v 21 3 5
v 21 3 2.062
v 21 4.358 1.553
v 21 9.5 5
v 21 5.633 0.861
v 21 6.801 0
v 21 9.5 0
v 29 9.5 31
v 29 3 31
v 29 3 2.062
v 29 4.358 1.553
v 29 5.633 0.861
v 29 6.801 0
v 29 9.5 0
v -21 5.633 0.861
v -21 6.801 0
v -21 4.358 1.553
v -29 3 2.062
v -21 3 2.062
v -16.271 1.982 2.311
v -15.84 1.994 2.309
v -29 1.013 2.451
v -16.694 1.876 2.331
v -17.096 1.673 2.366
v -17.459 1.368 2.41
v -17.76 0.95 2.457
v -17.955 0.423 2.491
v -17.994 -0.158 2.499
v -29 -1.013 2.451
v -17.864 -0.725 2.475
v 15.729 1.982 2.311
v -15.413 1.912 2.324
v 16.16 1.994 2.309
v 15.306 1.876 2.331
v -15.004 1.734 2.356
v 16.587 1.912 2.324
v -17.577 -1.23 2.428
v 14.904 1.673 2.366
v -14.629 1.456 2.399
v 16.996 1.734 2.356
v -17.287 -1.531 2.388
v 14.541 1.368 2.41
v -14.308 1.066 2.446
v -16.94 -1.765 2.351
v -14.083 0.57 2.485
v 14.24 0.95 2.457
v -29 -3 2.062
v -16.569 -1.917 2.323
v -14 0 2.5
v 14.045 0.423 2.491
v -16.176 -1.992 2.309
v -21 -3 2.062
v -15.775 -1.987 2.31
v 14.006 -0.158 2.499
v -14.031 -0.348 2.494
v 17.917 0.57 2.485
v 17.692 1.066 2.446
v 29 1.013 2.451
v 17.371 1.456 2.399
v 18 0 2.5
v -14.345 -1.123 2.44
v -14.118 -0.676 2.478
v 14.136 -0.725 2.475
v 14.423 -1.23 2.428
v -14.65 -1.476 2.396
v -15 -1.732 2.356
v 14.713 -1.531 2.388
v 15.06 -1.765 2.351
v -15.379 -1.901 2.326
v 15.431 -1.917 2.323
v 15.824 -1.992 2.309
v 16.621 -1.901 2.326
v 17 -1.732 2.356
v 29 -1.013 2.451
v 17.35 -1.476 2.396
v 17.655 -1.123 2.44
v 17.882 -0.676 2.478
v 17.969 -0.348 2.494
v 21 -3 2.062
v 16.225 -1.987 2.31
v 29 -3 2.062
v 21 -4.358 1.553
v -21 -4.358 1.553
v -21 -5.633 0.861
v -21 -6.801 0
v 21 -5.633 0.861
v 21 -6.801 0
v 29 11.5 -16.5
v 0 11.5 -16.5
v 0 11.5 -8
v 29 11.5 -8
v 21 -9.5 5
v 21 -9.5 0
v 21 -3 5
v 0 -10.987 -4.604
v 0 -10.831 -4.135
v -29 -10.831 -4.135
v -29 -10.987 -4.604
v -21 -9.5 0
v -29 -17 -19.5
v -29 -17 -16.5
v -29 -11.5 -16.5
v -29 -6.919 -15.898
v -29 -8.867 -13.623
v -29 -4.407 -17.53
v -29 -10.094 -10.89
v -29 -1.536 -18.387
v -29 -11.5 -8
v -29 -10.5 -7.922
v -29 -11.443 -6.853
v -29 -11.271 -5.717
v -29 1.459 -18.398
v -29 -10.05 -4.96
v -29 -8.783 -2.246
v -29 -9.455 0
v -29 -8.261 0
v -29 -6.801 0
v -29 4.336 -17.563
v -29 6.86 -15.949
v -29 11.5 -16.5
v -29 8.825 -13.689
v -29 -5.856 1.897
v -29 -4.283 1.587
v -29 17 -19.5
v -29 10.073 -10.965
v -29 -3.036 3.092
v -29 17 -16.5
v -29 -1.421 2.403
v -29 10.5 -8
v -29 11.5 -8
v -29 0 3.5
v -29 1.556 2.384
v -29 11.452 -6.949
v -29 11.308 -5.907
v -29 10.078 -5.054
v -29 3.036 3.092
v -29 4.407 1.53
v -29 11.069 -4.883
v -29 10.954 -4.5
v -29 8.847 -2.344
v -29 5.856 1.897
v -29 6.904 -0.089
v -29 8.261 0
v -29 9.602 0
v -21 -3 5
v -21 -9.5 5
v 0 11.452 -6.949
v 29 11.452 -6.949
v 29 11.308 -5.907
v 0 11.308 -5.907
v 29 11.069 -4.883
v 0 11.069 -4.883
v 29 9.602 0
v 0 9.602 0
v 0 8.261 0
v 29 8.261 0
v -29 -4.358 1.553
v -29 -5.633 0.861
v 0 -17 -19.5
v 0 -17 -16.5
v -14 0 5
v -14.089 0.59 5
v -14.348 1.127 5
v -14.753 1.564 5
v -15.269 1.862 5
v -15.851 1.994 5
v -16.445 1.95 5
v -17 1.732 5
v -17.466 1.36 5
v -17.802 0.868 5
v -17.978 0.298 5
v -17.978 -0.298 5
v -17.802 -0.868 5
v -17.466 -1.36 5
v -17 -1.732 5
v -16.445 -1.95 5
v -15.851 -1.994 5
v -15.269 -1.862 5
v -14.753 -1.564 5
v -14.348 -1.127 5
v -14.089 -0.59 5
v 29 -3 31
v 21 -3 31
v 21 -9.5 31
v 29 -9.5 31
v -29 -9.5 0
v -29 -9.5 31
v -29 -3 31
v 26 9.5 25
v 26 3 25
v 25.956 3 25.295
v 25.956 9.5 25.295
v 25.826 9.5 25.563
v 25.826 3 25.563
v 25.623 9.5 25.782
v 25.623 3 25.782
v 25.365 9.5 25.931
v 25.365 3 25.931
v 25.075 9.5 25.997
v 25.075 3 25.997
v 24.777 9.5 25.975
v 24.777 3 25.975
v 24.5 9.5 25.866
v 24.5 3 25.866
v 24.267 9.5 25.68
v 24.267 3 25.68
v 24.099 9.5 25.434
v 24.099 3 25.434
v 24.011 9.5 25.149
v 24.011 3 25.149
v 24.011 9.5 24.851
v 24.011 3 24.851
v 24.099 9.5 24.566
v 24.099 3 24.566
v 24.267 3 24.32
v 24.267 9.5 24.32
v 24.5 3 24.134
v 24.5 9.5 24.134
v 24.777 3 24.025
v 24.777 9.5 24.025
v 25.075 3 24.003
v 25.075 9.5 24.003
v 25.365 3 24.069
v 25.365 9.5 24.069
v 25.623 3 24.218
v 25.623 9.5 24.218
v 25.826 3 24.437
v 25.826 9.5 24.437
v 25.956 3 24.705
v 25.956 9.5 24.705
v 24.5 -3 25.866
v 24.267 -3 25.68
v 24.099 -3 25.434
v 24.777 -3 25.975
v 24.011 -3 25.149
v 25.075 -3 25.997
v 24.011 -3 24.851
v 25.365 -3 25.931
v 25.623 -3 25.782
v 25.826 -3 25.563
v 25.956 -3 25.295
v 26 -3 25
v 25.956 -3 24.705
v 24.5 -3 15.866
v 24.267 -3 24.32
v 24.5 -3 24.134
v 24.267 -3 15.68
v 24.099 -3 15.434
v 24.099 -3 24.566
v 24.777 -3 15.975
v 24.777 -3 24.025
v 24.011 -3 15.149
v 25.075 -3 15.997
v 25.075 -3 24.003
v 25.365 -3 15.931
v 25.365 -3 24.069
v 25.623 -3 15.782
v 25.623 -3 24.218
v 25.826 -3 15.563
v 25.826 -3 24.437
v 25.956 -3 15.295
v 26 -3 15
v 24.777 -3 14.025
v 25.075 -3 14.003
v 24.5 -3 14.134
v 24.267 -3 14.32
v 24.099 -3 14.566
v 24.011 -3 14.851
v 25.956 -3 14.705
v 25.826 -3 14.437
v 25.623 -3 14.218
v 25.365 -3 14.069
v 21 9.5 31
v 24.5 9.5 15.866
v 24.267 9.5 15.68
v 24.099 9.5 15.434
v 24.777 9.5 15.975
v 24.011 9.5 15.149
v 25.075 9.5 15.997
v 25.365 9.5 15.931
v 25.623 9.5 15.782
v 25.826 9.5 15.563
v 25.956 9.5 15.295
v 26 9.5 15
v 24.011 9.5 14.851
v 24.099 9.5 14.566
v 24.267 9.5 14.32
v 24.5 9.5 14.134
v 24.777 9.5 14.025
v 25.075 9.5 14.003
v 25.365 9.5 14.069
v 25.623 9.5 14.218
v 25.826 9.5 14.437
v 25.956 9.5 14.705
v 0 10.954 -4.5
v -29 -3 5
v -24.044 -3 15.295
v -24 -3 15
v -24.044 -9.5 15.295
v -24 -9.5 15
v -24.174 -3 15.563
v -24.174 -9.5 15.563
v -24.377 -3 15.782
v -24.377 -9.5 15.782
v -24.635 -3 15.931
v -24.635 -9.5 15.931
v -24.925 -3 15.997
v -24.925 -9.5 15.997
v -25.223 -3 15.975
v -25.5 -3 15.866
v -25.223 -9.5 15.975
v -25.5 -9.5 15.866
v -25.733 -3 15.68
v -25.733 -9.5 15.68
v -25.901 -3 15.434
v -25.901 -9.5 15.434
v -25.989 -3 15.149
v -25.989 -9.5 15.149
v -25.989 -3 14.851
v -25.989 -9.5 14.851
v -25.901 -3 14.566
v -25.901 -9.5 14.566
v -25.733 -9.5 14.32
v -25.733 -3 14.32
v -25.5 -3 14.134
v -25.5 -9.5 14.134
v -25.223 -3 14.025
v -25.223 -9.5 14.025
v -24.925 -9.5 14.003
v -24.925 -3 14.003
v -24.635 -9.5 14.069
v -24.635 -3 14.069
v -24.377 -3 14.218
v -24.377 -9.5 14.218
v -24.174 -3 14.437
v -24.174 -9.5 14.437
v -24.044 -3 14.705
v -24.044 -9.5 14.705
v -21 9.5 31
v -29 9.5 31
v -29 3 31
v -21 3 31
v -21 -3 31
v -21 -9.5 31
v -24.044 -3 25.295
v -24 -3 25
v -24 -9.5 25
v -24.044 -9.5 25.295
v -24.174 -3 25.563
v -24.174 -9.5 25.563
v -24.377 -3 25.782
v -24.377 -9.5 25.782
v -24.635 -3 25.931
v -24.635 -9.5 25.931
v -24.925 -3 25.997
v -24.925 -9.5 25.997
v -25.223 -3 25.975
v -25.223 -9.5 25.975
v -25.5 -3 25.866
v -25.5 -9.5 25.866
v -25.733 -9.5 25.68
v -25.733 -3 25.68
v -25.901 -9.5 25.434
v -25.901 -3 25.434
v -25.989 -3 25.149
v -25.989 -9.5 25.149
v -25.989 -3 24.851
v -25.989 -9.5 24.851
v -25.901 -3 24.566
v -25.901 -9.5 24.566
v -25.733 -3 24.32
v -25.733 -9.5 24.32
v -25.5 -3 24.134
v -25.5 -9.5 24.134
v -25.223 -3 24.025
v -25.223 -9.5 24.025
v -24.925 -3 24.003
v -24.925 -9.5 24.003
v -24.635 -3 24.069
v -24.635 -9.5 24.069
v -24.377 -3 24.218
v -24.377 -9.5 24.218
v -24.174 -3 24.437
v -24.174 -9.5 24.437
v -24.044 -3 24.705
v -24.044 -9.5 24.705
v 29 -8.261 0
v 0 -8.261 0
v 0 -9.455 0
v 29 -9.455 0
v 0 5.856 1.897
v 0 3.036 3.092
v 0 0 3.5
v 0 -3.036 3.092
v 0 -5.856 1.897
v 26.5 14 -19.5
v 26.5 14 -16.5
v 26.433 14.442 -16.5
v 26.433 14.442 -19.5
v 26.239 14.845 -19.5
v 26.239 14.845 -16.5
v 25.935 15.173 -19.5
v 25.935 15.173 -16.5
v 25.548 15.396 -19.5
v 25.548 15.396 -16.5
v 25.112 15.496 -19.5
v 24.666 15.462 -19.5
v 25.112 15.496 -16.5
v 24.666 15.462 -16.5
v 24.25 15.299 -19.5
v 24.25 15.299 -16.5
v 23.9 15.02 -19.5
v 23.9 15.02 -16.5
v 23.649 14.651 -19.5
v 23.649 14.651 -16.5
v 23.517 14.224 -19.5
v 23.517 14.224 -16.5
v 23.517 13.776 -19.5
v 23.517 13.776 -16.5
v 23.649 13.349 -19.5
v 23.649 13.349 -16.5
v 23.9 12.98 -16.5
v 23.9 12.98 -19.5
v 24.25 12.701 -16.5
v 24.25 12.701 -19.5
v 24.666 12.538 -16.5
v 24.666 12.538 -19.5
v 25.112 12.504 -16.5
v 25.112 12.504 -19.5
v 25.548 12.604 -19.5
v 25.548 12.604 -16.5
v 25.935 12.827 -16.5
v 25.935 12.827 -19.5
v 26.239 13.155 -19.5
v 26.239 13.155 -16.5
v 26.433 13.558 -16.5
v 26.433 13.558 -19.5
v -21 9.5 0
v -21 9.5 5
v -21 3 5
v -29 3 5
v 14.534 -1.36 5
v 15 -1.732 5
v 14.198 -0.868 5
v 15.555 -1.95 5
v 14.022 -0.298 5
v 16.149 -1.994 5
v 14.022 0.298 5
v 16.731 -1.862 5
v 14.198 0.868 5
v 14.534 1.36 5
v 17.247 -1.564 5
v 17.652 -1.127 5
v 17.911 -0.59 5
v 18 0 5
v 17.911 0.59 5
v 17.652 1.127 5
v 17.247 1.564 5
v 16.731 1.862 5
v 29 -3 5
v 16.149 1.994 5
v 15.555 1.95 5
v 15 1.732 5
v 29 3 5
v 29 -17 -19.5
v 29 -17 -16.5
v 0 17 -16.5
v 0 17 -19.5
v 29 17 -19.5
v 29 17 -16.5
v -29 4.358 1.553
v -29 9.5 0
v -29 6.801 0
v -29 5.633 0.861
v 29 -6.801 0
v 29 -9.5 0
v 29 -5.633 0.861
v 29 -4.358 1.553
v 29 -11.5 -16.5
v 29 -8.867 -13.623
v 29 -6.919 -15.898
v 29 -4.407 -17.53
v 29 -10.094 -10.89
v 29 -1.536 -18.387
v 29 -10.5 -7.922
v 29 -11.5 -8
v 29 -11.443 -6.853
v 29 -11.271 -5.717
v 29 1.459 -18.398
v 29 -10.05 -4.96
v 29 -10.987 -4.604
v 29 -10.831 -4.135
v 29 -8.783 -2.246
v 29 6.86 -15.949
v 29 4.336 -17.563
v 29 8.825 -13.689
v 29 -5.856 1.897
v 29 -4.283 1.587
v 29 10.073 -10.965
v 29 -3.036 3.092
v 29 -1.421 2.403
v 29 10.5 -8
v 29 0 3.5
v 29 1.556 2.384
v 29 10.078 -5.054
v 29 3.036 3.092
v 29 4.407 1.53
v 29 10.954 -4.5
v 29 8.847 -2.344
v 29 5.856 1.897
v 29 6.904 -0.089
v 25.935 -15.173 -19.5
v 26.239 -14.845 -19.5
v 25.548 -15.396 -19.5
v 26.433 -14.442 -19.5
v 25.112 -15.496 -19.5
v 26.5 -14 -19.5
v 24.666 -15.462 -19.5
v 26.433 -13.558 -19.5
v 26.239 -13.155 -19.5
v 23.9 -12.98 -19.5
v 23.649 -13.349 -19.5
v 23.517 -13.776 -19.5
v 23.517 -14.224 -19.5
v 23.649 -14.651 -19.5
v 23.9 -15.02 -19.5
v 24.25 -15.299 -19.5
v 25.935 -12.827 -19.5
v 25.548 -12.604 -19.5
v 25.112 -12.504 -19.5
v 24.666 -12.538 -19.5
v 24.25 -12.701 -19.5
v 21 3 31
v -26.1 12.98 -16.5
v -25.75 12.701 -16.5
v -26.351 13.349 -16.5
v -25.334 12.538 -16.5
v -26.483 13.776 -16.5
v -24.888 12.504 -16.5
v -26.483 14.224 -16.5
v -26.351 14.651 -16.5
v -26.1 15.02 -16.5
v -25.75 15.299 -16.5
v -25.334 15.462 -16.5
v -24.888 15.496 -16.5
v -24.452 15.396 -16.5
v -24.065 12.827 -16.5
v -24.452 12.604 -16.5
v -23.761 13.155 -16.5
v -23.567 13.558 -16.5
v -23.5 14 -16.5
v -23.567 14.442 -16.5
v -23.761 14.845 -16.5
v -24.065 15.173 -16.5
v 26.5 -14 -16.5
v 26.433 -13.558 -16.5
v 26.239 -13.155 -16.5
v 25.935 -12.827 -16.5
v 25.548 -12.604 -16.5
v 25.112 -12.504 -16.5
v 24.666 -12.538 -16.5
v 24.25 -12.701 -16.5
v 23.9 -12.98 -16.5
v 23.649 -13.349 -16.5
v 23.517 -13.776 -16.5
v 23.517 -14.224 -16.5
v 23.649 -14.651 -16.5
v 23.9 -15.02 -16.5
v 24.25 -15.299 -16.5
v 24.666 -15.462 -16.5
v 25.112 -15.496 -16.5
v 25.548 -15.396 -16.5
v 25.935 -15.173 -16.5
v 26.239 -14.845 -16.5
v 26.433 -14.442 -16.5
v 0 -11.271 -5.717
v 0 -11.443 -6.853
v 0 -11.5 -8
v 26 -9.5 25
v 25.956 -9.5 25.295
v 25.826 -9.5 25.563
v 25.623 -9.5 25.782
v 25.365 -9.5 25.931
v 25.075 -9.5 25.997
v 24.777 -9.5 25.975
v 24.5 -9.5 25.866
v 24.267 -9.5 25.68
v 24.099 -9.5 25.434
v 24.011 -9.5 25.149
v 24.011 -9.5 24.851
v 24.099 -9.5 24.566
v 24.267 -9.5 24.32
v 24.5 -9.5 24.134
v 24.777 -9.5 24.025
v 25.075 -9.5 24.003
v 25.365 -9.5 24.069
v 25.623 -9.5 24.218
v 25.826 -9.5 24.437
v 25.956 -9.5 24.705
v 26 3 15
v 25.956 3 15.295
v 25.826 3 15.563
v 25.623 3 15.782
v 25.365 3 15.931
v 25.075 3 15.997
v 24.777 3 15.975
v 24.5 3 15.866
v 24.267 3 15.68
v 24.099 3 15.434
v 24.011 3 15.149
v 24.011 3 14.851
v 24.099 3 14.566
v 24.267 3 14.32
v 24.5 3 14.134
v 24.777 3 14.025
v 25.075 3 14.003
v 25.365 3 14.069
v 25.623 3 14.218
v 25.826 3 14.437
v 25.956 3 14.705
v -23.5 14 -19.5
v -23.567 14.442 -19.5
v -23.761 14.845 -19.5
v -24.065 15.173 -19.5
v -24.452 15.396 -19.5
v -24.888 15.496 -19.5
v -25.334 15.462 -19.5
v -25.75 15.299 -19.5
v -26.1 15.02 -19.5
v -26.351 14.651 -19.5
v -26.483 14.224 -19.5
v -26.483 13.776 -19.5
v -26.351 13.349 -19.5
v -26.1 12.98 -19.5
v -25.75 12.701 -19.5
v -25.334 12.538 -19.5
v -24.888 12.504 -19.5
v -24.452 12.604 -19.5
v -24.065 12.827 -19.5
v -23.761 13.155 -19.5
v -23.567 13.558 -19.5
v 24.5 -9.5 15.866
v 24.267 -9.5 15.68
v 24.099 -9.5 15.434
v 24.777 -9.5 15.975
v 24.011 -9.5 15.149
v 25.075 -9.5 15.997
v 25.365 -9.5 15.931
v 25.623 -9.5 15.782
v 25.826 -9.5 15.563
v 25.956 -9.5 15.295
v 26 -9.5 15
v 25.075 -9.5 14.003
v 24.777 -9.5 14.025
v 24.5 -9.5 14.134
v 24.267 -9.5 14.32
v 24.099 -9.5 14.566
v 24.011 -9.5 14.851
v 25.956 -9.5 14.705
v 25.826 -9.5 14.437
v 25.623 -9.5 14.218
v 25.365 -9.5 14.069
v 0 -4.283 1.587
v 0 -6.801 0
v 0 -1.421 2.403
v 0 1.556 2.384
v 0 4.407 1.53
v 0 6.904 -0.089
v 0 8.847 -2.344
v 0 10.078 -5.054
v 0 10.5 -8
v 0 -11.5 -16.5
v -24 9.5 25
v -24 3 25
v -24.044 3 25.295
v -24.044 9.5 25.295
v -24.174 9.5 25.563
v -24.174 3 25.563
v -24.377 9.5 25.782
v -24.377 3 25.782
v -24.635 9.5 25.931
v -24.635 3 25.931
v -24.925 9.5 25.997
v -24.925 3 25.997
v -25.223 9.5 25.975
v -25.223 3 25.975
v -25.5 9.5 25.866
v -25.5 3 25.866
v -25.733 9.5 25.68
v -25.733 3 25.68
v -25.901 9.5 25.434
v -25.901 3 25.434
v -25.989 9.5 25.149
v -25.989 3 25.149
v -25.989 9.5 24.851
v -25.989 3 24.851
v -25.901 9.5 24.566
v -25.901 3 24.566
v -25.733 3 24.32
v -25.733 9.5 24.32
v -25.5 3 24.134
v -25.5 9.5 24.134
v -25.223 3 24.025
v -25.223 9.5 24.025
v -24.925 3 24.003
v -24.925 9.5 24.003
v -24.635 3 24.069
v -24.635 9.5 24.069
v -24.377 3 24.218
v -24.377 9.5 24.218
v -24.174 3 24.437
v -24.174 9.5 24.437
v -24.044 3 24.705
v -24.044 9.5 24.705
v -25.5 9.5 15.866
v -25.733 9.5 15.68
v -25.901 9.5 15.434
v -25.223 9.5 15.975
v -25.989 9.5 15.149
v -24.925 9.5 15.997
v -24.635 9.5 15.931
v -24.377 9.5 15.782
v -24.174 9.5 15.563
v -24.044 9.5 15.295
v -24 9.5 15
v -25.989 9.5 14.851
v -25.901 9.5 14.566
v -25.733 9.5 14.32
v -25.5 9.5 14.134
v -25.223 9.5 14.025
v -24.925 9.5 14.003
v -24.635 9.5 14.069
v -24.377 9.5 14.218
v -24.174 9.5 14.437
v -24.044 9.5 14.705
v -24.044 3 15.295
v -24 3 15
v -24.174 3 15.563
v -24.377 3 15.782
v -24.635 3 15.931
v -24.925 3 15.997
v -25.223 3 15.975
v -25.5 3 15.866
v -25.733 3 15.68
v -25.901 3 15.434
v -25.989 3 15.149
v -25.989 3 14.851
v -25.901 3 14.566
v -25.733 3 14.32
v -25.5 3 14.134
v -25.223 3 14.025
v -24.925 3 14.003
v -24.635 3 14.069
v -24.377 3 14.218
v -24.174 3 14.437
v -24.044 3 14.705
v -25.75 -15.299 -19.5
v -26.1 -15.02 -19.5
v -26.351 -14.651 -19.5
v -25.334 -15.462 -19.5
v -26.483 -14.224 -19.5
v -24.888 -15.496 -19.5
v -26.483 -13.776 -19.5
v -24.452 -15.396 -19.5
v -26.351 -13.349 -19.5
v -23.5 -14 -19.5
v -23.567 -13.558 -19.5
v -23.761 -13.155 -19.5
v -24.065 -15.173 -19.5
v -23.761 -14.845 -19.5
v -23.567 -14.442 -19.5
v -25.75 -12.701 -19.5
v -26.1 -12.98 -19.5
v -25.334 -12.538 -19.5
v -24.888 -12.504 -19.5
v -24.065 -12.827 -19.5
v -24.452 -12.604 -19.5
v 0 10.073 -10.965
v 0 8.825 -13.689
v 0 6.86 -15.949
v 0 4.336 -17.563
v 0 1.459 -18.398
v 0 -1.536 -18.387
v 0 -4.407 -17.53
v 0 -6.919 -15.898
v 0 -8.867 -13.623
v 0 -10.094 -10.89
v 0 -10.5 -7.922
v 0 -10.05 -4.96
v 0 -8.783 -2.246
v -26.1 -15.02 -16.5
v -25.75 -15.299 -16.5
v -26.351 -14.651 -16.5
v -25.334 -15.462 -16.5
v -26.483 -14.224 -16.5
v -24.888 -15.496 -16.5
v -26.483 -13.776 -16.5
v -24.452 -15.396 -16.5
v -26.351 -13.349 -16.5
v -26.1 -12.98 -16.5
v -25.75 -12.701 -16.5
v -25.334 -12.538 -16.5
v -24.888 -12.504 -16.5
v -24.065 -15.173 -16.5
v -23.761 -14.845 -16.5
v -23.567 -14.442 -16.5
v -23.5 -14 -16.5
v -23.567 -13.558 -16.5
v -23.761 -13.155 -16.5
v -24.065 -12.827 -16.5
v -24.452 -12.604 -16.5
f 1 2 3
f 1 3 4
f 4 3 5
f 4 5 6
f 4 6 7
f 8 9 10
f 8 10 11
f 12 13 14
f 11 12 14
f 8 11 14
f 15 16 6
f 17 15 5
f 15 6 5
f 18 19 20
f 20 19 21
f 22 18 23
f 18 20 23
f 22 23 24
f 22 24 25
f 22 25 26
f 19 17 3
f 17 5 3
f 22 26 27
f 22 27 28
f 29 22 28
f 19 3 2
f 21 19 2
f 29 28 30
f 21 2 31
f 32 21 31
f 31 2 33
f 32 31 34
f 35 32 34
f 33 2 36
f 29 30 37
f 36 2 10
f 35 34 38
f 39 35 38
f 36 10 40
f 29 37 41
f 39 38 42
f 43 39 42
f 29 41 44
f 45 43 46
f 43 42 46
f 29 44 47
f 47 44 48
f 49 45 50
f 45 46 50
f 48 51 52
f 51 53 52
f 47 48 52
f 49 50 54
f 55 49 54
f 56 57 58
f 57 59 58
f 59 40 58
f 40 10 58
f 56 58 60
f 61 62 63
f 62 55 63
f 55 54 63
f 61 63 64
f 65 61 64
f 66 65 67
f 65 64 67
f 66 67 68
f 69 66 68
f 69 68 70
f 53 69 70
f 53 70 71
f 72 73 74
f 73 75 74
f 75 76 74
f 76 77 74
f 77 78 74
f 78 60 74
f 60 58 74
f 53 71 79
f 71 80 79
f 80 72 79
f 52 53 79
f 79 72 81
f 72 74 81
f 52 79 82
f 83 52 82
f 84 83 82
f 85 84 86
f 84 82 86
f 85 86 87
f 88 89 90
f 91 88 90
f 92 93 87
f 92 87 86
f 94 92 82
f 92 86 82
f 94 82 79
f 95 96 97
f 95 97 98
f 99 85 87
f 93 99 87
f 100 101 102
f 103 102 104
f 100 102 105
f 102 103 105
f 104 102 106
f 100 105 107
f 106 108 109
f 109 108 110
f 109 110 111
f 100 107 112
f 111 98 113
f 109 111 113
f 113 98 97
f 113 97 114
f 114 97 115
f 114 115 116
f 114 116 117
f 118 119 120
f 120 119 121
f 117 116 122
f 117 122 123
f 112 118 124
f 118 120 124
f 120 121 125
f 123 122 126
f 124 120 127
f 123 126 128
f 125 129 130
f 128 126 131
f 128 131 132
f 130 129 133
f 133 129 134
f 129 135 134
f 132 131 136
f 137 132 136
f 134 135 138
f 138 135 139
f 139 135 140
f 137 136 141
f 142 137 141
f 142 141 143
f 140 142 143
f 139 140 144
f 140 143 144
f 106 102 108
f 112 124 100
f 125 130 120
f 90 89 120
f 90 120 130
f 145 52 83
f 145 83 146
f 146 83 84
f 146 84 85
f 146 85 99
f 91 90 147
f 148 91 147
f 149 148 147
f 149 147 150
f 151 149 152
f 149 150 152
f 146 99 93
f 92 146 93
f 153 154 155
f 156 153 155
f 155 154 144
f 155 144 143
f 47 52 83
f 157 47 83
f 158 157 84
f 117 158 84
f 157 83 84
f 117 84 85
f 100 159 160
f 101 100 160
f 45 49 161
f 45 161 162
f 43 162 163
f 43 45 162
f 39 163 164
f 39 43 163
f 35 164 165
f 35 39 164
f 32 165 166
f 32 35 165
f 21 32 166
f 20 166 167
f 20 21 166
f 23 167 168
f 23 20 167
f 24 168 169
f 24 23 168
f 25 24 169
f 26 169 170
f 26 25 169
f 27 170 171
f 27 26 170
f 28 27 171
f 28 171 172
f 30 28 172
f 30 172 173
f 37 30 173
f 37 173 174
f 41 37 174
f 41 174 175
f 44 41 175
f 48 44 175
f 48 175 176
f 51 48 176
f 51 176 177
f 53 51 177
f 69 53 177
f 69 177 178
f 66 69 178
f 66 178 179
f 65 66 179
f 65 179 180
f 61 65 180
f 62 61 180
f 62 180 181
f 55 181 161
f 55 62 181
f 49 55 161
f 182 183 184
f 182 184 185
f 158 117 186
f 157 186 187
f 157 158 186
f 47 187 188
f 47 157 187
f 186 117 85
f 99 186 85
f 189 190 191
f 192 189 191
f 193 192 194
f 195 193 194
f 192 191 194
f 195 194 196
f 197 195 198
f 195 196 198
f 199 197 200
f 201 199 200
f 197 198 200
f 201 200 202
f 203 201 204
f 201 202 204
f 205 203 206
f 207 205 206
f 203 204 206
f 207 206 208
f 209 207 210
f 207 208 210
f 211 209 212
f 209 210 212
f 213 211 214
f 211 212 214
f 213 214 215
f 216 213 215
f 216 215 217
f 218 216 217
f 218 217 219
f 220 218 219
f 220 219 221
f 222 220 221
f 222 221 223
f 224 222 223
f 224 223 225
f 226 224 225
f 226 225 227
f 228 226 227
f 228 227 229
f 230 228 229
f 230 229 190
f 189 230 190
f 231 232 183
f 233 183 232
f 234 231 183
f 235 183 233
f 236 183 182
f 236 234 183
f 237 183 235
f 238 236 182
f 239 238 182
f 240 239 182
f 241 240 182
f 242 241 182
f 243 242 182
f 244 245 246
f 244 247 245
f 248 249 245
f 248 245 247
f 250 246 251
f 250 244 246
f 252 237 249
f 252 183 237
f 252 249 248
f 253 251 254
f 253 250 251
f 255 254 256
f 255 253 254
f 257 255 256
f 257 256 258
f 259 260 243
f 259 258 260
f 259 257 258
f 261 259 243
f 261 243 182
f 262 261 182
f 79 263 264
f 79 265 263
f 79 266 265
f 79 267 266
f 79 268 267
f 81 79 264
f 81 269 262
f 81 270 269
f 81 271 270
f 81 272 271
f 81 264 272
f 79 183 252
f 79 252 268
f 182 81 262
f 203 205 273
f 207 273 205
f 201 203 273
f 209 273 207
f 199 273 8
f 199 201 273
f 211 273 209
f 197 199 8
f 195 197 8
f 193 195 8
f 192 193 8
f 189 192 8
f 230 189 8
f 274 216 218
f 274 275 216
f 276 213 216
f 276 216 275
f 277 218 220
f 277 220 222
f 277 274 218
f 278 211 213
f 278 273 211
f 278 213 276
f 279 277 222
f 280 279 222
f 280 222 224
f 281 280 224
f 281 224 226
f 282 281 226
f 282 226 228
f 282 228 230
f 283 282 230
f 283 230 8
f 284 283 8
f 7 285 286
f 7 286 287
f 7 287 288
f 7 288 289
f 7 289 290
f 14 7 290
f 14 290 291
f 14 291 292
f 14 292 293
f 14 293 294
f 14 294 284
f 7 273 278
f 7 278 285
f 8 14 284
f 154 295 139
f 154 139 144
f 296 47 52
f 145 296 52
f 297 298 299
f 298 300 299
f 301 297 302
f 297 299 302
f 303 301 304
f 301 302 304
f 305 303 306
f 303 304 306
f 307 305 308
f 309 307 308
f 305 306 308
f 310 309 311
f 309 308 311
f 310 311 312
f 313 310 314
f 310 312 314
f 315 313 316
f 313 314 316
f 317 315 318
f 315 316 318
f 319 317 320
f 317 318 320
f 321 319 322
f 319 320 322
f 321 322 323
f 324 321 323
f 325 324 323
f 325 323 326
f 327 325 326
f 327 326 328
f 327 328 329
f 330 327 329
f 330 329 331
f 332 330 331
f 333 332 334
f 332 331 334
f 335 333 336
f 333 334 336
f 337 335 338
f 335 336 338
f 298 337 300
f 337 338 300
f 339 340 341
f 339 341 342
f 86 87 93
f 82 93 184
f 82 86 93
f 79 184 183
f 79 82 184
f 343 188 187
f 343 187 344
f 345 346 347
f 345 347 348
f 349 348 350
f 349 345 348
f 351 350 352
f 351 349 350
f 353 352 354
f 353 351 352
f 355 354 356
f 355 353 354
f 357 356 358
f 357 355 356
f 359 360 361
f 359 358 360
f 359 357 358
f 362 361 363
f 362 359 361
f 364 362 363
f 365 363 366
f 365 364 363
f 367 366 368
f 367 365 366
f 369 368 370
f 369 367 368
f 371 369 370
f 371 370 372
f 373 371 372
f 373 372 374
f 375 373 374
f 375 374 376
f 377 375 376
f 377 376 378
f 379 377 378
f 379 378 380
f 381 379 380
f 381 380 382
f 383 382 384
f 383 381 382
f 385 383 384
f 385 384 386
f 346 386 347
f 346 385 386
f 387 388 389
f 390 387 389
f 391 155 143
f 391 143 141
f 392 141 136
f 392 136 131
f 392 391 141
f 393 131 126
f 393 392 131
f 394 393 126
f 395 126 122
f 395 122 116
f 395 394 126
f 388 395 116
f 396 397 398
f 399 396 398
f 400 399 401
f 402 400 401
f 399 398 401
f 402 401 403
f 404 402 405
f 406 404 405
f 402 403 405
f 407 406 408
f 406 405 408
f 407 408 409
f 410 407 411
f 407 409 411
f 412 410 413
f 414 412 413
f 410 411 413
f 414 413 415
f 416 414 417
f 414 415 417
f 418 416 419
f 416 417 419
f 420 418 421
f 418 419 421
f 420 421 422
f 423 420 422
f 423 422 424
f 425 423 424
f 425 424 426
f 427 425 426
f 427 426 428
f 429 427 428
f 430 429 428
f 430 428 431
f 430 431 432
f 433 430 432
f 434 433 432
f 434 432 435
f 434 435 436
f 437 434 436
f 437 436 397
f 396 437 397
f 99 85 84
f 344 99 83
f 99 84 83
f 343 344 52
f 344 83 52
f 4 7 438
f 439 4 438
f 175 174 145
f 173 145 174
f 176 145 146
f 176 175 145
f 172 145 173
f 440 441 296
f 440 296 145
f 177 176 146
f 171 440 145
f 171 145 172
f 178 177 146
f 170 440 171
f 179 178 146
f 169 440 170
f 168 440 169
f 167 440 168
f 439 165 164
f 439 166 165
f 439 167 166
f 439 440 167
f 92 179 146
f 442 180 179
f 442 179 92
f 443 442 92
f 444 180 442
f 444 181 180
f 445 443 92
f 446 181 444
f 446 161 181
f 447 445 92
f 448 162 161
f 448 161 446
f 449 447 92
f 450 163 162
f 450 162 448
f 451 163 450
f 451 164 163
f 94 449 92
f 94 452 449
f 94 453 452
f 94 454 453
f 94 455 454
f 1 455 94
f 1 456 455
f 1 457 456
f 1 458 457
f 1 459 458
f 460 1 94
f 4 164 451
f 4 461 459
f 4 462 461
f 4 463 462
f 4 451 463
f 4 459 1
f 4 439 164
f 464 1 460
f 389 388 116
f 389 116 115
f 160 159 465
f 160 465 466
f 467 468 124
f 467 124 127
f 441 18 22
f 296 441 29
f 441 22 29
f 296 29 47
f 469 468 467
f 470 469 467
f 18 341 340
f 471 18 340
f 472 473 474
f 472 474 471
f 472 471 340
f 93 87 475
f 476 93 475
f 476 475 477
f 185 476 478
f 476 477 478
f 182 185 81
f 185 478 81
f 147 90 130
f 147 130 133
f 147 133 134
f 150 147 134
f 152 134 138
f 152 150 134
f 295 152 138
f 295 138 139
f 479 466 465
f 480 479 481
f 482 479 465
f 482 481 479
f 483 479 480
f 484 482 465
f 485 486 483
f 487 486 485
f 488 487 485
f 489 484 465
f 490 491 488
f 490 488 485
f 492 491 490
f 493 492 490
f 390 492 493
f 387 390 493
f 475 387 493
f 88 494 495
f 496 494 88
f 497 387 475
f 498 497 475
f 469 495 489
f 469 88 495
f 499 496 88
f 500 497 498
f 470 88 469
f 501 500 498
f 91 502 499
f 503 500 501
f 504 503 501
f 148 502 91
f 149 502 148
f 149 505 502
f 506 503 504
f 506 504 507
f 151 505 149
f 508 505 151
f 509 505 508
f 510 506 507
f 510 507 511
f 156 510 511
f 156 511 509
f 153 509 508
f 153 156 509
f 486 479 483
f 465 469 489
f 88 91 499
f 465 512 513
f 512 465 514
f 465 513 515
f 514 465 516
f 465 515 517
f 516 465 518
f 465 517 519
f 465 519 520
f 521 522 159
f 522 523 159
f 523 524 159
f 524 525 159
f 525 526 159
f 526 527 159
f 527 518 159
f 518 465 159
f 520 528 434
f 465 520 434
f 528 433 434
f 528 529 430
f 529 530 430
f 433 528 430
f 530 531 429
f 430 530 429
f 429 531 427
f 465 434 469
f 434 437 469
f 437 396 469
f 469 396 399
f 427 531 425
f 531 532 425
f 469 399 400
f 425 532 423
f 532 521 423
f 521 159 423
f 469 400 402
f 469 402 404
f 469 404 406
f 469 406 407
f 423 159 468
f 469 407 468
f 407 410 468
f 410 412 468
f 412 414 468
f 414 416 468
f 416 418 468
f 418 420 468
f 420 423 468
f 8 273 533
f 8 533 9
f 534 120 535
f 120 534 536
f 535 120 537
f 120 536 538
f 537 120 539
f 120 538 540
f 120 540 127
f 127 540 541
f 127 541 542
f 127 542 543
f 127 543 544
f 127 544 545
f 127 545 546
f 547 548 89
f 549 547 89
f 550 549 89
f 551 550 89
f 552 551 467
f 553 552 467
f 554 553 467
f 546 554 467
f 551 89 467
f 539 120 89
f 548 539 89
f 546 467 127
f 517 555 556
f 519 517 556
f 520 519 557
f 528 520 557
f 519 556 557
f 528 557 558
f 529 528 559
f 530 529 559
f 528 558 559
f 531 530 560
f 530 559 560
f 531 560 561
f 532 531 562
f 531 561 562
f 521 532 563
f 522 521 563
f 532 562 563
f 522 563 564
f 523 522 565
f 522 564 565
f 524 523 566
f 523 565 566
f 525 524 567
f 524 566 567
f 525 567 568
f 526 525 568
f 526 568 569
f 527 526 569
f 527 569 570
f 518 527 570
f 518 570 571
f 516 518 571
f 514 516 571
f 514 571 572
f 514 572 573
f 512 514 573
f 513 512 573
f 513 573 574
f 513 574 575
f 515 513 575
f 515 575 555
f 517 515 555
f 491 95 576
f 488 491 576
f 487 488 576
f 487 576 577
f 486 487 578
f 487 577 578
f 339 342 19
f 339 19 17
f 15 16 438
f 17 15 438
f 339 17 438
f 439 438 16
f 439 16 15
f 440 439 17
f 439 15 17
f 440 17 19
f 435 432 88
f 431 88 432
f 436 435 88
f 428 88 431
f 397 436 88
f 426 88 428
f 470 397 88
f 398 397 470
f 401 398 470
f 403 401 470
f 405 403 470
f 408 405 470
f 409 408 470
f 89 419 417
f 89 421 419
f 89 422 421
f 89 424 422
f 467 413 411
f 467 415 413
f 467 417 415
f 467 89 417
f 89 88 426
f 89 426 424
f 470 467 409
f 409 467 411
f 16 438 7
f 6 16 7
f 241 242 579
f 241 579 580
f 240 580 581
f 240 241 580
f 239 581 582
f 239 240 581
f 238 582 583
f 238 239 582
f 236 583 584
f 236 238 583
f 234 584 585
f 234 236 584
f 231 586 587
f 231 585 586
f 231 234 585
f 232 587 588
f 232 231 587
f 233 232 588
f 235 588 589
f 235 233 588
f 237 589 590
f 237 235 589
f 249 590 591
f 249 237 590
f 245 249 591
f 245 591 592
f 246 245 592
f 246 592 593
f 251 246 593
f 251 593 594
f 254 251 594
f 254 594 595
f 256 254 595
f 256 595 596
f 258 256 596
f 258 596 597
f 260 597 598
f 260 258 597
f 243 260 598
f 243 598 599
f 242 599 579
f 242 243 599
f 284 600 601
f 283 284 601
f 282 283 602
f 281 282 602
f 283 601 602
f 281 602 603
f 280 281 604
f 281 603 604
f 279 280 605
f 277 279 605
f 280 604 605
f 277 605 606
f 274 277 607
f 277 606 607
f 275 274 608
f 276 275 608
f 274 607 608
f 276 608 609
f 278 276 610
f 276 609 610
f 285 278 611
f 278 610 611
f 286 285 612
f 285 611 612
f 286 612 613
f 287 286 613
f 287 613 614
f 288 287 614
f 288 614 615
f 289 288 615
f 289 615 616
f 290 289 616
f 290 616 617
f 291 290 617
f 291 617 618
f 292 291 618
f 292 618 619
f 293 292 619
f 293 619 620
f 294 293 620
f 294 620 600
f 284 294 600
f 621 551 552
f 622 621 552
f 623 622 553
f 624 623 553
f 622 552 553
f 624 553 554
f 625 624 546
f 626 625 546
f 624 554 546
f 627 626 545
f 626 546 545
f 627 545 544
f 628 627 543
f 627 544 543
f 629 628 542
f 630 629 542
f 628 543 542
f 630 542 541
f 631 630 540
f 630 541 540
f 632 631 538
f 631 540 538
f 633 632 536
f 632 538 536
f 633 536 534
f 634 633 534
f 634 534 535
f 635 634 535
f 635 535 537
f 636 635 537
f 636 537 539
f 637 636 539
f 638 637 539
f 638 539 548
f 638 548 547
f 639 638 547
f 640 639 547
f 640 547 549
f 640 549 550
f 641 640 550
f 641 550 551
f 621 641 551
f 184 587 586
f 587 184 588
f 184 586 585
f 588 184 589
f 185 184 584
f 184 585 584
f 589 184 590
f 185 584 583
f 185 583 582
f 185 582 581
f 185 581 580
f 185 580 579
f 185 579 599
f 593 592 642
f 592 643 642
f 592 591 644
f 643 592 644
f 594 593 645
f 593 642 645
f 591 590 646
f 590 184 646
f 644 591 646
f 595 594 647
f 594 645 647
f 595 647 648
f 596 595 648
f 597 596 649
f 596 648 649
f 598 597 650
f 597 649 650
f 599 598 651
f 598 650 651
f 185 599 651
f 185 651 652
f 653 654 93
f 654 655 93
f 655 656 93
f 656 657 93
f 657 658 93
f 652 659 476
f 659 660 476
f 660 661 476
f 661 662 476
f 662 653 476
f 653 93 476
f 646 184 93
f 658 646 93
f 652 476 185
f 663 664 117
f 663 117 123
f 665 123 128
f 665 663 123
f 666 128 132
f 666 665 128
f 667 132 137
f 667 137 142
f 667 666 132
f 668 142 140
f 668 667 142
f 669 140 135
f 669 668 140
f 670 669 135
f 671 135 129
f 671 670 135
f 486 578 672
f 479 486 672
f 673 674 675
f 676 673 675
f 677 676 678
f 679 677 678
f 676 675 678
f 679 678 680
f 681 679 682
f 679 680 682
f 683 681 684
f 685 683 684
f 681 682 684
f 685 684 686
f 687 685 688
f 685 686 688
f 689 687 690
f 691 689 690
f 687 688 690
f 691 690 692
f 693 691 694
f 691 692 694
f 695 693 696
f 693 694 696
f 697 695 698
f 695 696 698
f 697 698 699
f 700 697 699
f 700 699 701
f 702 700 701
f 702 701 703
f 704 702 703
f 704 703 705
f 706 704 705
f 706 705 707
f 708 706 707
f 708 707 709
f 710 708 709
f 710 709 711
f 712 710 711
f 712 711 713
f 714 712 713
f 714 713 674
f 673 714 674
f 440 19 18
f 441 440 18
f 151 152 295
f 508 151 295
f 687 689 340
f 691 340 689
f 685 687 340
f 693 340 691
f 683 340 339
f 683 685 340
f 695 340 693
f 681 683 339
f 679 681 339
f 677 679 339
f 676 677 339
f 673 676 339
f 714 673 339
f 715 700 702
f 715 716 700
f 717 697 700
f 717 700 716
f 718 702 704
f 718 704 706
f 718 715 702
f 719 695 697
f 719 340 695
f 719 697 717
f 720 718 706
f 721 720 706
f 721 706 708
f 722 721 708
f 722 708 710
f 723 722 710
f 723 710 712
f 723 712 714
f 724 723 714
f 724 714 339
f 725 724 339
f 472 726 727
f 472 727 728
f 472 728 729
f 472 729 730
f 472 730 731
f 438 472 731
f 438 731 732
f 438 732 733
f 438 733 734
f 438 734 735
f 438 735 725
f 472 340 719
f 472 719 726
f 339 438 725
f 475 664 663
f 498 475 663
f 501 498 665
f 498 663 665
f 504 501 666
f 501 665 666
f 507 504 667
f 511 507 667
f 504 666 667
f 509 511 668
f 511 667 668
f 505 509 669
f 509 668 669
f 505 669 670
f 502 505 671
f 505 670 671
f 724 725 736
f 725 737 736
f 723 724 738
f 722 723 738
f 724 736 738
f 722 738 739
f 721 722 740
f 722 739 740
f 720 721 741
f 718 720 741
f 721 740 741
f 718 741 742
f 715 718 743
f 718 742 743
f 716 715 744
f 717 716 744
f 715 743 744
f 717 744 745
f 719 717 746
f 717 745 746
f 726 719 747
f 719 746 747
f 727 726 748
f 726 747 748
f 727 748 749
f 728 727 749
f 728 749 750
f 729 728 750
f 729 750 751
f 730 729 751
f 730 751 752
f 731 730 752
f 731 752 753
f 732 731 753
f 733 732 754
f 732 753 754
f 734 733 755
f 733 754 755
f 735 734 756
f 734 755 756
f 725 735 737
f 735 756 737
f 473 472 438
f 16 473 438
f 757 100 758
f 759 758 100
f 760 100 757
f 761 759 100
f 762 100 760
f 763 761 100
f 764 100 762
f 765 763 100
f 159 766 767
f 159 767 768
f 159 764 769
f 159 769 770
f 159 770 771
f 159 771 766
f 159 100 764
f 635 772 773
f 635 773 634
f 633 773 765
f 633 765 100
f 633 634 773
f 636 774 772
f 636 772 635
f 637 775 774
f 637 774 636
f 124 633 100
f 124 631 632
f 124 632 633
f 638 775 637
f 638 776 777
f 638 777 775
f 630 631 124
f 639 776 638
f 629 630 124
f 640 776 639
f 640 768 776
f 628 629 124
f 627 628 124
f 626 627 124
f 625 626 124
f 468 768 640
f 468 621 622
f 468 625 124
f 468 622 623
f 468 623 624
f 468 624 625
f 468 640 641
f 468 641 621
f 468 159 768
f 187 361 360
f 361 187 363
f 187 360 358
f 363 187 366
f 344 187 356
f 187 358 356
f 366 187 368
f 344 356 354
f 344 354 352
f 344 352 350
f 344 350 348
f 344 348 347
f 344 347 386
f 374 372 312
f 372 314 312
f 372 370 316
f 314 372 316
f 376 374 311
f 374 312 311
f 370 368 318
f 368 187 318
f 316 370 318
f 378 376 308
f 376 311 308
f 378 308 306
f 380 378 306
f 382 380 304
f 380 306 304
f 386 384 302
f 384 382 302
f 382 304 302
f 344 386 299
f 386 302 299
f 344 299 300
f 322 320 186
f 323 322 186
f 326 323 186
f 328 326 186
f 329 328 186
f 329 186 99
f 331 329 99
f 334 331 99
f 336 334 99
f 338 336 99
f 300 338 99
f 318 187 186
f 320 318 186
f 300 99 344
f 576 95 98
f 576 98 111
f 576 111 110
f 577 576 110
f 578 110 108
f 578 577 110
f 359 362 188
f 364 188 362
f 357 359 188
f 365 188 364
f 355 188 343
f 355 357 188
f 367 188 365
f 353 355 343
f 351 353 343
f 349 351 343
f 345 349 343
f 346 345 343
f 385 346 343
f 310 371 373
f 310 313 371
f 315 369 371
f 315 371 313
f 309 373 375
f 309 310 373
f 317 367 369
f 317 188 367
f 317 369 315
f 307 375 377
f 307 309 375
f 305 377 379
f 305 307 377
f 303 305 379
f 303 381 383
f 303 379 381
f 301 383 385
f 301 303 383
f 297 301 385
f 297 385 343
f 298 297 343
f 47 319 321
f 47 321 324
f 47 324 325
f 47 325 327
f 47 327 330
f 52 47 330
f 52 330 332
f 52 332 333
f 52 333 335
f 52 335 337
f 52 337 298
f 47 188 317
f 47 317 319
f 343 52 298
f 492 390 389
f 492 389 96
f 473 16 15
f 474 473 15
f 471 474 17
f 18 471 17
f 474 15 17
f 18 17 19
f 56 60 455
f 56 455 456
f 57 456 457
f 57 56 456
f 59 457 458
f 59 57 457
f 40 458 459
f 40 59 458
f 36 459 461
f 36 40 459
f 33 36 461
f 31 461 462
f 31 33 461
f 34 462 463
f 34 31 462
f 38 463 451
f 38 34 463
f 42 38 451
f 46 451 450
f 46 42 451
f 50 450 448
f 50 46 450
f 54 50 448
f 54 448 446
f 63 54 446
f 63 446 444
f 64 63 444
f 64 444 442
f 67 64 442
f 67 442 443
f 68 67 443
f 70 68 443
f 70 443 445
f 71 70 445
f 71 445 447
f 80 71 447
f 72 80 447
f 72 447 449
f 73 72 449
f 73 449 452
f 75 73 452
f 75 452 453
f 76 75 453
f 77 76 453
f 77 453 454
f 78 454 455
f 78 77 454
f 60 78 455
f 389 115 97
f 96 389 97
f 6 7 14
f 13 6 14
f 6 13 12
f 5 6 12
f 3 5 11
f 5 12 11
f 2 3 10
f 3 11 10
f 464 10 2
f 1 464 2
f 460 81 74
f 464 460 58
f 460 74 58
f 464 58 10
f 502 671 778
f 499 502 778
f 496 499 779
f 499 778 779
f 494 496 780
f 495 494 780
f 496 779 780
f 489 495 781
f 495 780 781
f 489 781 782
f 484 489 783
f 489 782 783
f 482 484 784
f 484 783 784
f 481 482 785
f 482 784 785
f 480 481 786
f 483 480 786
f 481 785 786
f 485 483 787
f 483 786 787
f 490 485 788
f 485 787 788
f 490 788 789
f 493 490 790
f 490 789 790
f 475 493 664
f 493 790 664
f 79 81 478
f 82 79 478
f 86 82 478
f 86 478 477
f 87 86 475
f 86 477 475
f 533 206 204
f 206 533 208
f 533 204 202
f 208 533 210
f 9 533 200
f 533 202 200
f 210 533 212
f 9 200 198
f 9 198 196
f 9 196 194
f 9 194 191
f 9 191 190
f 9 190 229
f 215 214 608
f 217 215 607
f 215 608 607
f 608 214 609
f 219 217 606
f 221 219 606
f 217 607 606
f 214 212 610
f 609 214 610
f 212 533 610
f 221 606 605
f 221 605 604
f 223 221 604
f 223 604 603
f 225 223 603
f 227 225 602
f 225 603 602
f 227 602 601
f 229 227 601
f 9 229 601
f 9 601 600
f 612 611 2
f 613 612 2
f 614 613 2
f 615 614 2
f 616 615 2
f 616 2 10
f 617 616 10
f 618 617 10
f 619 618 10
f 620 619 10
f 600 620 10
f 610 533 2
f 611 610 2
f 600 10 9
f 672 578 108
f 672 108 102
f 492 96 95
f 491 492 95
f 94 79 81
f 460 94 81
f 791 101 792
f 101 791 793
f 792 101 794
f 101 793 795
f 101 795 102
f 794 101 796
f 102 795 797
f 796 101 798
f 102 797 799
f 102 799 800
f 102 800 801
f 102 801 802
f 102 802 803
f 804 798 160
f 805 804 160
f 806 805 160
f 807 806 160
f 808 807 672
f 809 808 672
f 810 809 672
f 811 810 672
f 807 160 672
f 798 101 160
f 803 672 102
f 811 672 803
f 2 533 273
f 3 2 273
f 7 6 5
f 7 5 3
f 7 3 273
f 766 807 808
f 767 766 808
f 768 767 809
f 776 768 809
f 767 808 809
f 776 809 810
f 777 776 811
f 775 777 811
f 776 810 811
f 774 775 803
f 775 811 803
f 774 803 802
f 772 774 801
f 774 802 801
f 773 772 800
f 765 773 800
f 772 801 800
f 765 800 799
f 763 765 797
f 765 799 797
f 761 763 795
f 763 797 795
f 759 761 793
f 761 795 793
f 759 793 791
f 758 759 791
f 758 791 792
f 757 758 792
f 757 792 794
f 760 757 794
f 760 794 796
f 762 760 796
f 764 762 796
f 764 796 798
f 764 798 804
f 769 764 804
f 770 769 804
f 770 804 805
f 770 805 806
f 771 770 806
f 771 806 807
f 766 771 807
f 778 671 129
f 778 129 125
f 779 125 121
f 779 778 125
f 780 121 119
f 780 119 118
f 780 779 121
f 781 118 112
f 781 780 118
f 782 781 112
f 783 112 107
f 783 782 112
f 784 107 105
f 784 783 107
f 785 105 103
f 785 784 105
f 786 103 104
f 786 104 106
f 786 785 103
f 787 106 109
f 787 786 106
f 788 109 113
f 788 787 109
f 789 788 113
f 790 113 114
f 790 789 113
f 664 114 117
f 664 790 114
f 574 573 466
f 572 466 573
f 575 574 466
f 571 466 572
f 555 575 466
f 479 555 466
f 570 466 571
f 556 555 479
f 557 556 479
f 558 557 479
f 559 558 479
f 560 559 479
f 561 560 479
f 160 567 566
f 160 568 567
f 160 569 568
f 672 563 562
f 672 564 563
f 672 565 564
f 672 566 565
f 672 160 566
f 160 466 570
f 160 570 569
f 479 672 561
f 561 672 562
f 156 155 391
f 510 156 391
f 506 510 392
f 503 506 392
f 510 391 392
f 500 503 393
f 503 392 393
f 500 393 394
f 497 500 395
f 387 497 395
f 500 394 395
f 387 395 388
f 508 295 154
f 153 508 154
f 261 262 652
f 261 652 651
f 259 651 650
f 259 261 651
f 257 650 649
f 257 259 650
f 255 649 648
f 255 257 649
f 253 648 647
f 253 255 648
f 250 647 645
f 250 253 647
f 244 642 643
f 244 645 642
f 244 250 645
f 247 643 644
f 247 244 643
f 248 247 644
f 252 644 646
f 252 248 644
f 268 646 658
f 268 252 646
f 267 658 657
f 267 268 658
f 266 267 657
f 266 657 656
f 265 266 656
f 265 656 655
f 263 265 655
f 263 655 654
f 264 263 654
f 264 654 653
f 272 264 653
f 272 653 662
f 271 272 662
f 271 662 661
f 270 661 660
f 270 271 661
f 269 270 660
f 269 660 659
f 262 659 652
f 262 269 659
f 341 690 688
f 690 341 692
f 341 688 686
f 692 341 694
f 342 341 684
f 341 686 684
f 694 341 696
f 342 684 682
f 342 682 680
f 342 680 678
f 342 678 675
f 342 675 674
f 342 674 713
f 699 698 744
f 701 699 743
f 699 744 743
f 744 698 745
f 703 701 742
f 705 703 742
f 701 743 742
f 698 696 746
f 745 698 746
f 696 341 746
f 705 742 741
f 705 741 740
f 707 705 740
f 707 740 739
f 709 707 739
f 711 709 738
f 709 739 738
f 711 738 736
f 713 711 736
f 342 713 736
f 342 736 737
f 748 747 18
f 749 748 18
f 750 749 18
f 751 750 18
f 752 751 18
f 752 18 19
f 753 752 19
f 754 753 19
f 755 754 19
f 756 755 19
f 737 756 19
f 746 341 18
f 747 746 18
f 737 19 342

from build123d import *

# Parameters (mm, degrees)
F0_W      = 8
F0_H      = 6.5
F1_DEPTH  = 31
F0_R      = 2
F2_DEPTH  = 5
F3_R      = 1
F4_DEPTH  = 12.5
F5_W      = 5.5
F5_H      = 3
F6_DEPTH  = 29
F9_R      = 10.5
F10_DEPTH = 83.001
F0_R_2    = 1.5
F11_DEPTH = 19.501


# Not quite as in the source:
# - the program builds the solid bodies; features that only make, move or delete a surface that nothing else refers to are left out


with BuildPart() as f1:
    # F0 (on Top) → F1 (new body)
    with BuildSketch(Plane.XY):
        with Locations((-25, 6.25)):
            Rectangle(F0_W, F0_H)
    extrude(amount=F1_DEPTH)


with BuildPart() as f1b:
    # F0 (on Top) → F1, piece 2 (new body)
    with BuildSketch(Plane.XY):
        with Locations((-25, -6.25)):
            Rectangle(F0_W, F0_H)
    extrude(amount=F1_DEPTH)


with BuildPart() as f1c:
    # F0 (on Top) → F1, piece 3 (new body)
    with BuildSketch(Plane.XY):
        with Locations((25, 6.25)):
            Rectangle(F0_W, F0_H)
    extrude(amount=F1_DEPTH)


with BuildPart() as f1d:
    # F0 (on Top) → F1, piece 4 (new body)
    with BuildSketch(Plane.XY):
        with Locations((25, -6.25)):
            Rectangle(F0_W, F0_H)
    extrude(amount=F1_DEPTH)


with BuildPart() as f2:
    # F0 (on Top) → F2 (new body)
    with BuildSketch(Plane.XY):
        Polygon((-21, -9.5), (21, -9.5), (21, -3), (29, -3), (29, 3), (21, 3), (21, 9.5), (-21, 9.5), (-21, 3), (-29, 3), (-29, -3), (-21, -3), align=None)
        with Locations((-16, 0)):
            Circle(F0_R, mode=Mode.SUBTRACT)
        with Locations((16, 0)):
            Circle(F0_R, mode=Mode.SUBTRACT)
    extrude(amount=F2_DEPTH)


with BuildPart() as f4_tool:
    # F3 (on Front) → F4 (new body, symmetric)
    with BuildSketch(Plane.XZ):
        with Locations((25, 25)):
            Circle(F3_R)
        with Locations((25, 15)):
            Circle(F3_R)
        with Locations((-25, 25)):
            Circle(F3_R)
        with Locations((-25, 15)):
            Circle(F3_R)
    extrude(amount=F4_DEPTH, both=True)


with BuildPart() as f1_1:
    add(f1.part)

    # F4: cut by f4_tool
    add(f4_tool.part, mode=Mode.SUBTRACT)


with BuildPart() as f1b_1:
    add(f1b.part)

    # F4: cut by f4_tool
    add(f4_tool.part, mode=Mode.SUBTRACT)


with BuildPart() as f1c_1:
    add(f1c.part)

    # F4: cut by f4_tool
    add(f4_tool.part, mode=Mode.SUBTRACT)


with BuildPart() as f1d_1:
    add(f1d.part)

    # F4: cut by f4_tool
    add(f4_tool.part, mode=Mode.SUBTRACT)


with BuildPart() as f6:
    # F5 (on Right) → F6 (new body, symmetric)
    with BuildSketch(Plane.YZ):
        with BuildLine():
            ThreePointArc((-10.8310090403, -4.1348682857), (-9.7674911279, -1.9298997482), (-8.2613558209, 0))
            Line((-8.2613558209, 0), (-9.4548137859, 0))
            Line((-9.4548137859, 0), (-10.8310090403, -4.1348682857))
        make_face()
        with BuildLine():
            ThreePointArc((6.8007352544, 0), (9.5304176239, -3.5930577591), (10.5, -8))
            ThreePointArc((10.5, -8), (-4.4069422409, -17.5304176239), (-6.8007352544, 0))
            Line((-6.8007352544, 0), (-8.2613558209, 0))
            ThreePointArc((-8.2613558209, 0), (-9.7674911279, -1.9298997482), (-10.8310090403, -4.1348682857))
            Line((-10.8310090403, -4.1348682857), (-10.9869876699, -4.6035162385))
            ThreePointArc((-10.9869876699, -4.6035162385), (-11.3710236611, -6.2824957356), (-11.5, -8))
            ThreePointArc((-11.5, -8), (-8.1317279836, -16.1317279836), (0, -19.5))
            ThreePointArc((0, -19.5), (8.1317279836, -16.1317279836), (11.5, -8))
            ThreePointArc((11.5, -8), (11.3918398808, -6.4264739816), (11.0693940642, -4.8825467043))
            Line((11.0693940642, -4.8825467043), (10.9543418745, -4.499658003))
            ThreePointArc((10.9543418745, -4.499658003), (9.8677499977, -2.0942815862), (8.2613558209, 0))
            Line((8.2613558209, 0), (6.8007352544, 0))
        make_face()
        with BuildLine():
            Line((9.6022635698, 0), (8.2613558209, 0))
            ThreePointArc((8.2613558209, 0), (9.8677499977, -2.0942815862), (10.9543418745, -4.499658003))
            Line((10.9543418745, -4.499658003), (9.6022635698, 0))
        make_face()
        with BuildLine():
            ThreePointArc((6.8007352544, 0), (9.5304176239, -3.5930577591), (10.5, -8))
            ThreePointArc((10.5, -8), (-4.4069422409, -17.5304176239), (-6.8007352544, 0))
            Line((-6.8007352544, 0), (-8.2613558209, 0))
            ThreePointArc((-8.2613558209, 0), (-9.7674911279, -1.9298997482), (-10.8310090403, -4.1348682857))
            Line((-10.8310090403, -4.1348682857), (-10.9869876699, -4.6035162385))
            ThreePointArc((-10.9869876699, -4.6035162385), (-11.3710236611, -6.2824957356), (-11.5, -8))
            ThreePointArc((-11.5, -8), (-8.1317279836, -16.1317279836), (0, -19.5))
            ThreePointArc((0, -19.5), (8.1317279836, -16.1317279836), (11.5, -8))
            ThreePointArc((11.5, -8), (11.3918398808, -6.4264739816), (11.0693940642, -4.8825467043))
            Line((11.0693940642, -4.8825467043), (10.9543418745, -4.499658003))
            ThreePointArc((10.9543418745, -4.499658003), (9.8677499977, -2.0942815862), (8.2613558209, 0))
            Line((8.2613558209, 0), (6.8007352544, 0))
        make_face()
        with BuildLine():
            ThreePointArc((-6.8007352544, 0), (0, 2.5), (6.8007352544, 0))
            Line((6.8007352544, 0), (8.2613558209, 0))
            ThreePointArc((8.2613558209, 0), (0, 3.5), (-8.2613558209, 0))
            Line((-8.2613558209, 0), (-6.8007352544, 0))
        make_face()
        with BuildLine():
            ThreePointArc((6.8007352544, 0), (9.5304176239, -3.5930577591), (10.5, -8))
            ThreePointArc((10.5, -8), (-4.4069422409, -17.5304176239), (-6.8007352544, 0))
            Line((-6.8007352544, 0), (-8.2613558209, 0))
            ThreePointArc((-8.2613558209, 0), (-9.7674911279, -1.9298997482), (-10.8310090403, -4.1348682857))
            Line((-10.8310090403, -4.1348682857), (-10.9869876699, -4.6035162385))
            ThreePointArc((-10.9869876699, -4.6035162385), (-11.3710236611, -6.2824957356), (-11.5, -8))
            ThreePointArc((-11.5, -8), (-8.1317279836, -16.1317279836), (0, -19.5))
            ThreePointArc((0, -19.5), (8.1317279836, -16.1317279836), (11.5, -8))
            ThreePointArc((11.5, -8), (11.3918398808, -6.4264739816), (11.0693940642, -4.8825467043))
            Line((11.0693940642, -4.8825467043), (10.9543418745, -4.499658003))
            ThreePointArc((10.9543418745, -4.499658003), (9.8677499977, -2.0942815862), (8.2613558209, 0))
            Line((8.2613558209, 0), (6.8007352544, 0))
        make_face()
        with BuildLine():
            Line((11.5, -16.5), (11.5, -8))
            ThreePointArc((11.5, -8), (8.1317279836, -16.1317279836), (0, -19.5))
            Line((0, -19.5), (11.5, -19.5))
            Line((11.5, -19.5), (11.5, -16.5))
        make_face()
        with BuildLine():
            ThreePointArc((0, -19.5), (-8.1317279836, -16.1317279836), (-11.5, -8))
            Line((-11.5, -8), (-11.5, -16.5))
            Line((-11.5, -16.5), (-11.5, -19.5))
            Line((-11.5, -19.5), (0, -19.5))
        make_face()
        with Locations((-14.25, -18)):
            Rectangle(F5_W, F5_H)
        with Locations((14.25, -18)):
            Rectangle(F5_W, F5_H)
        with BuildLine():
            ThreePointArc((-6.8007352544, 0), (0, 2.5), (6.8007352544, 0))
            Line((6.8007352544, 0), (8.2613558209, 0))
            ThreePointArc((8.2613558209, 0), (0, 3.5), (-8.2613558209, 0))
            Line((-8.2613558209, 0), (-6.8007352544, 0))
        make_face()
    extrude(amount=F6_DEPTH, both=True)

    # F0 (on Top) → F11 (cut, through all)
    with BuildSketch(Plane.XY):
        with Locations((-25, -14)):
            Circle(F0_R_2)
        with Locations((25, -14)):
            Circle(F0_R_2)
        with Locations((-25, 14)):
            Circle(F0_R_2)
        with Locations((25, 14)):
            Circle(F0_R_2)
    extrude(amount=-F11_DEPTH, mode=Mode.SUBTRACT)


with BuildPart() as f10_tool:
    # F9 (on offset) → F10 (new body, through all)
    with BuildSketch(Plane.YZ.offset(54)):
        with Locations((0, -8)):
            Circle(F9_R)
    extrude(amount=-F10_DEPTH)


with BuildPart() as f1_2:
    add(f1_1.part)

    # F10: cut by f10_tool
    add(f10_tool.part, mode=Mode.SUBTRACT)


with BuildPart() as f1b_2:
    add(f1b_1.part)

    # F10: cut by f10_tool
    add(f10_tool.part, mode=Mode.SUBTRACT)


with BuildPart() as f1c_2:
    add(f1c_1.part)

    # F10: cut by f10_tool
    add(f10_tool.part, mode=Mode.SUBTRACT)


with BuildPart() as f1d_2:
    add(f1d_1.part)

    # F10: cut by f10_tool
    add(f10_tool.part, mode=Mode.SUBTRACT)


with BuildPart() as f2_1:
    add(f2.part)

    # F10: cut by f10_tool
    add(f10_tool.part, mode=Mode.SUBTRACT)


solid = Compound([f6.part, f1_2.part, f1b_2.part, f1c_2.part, f1d_2.part, f2_1.part])
